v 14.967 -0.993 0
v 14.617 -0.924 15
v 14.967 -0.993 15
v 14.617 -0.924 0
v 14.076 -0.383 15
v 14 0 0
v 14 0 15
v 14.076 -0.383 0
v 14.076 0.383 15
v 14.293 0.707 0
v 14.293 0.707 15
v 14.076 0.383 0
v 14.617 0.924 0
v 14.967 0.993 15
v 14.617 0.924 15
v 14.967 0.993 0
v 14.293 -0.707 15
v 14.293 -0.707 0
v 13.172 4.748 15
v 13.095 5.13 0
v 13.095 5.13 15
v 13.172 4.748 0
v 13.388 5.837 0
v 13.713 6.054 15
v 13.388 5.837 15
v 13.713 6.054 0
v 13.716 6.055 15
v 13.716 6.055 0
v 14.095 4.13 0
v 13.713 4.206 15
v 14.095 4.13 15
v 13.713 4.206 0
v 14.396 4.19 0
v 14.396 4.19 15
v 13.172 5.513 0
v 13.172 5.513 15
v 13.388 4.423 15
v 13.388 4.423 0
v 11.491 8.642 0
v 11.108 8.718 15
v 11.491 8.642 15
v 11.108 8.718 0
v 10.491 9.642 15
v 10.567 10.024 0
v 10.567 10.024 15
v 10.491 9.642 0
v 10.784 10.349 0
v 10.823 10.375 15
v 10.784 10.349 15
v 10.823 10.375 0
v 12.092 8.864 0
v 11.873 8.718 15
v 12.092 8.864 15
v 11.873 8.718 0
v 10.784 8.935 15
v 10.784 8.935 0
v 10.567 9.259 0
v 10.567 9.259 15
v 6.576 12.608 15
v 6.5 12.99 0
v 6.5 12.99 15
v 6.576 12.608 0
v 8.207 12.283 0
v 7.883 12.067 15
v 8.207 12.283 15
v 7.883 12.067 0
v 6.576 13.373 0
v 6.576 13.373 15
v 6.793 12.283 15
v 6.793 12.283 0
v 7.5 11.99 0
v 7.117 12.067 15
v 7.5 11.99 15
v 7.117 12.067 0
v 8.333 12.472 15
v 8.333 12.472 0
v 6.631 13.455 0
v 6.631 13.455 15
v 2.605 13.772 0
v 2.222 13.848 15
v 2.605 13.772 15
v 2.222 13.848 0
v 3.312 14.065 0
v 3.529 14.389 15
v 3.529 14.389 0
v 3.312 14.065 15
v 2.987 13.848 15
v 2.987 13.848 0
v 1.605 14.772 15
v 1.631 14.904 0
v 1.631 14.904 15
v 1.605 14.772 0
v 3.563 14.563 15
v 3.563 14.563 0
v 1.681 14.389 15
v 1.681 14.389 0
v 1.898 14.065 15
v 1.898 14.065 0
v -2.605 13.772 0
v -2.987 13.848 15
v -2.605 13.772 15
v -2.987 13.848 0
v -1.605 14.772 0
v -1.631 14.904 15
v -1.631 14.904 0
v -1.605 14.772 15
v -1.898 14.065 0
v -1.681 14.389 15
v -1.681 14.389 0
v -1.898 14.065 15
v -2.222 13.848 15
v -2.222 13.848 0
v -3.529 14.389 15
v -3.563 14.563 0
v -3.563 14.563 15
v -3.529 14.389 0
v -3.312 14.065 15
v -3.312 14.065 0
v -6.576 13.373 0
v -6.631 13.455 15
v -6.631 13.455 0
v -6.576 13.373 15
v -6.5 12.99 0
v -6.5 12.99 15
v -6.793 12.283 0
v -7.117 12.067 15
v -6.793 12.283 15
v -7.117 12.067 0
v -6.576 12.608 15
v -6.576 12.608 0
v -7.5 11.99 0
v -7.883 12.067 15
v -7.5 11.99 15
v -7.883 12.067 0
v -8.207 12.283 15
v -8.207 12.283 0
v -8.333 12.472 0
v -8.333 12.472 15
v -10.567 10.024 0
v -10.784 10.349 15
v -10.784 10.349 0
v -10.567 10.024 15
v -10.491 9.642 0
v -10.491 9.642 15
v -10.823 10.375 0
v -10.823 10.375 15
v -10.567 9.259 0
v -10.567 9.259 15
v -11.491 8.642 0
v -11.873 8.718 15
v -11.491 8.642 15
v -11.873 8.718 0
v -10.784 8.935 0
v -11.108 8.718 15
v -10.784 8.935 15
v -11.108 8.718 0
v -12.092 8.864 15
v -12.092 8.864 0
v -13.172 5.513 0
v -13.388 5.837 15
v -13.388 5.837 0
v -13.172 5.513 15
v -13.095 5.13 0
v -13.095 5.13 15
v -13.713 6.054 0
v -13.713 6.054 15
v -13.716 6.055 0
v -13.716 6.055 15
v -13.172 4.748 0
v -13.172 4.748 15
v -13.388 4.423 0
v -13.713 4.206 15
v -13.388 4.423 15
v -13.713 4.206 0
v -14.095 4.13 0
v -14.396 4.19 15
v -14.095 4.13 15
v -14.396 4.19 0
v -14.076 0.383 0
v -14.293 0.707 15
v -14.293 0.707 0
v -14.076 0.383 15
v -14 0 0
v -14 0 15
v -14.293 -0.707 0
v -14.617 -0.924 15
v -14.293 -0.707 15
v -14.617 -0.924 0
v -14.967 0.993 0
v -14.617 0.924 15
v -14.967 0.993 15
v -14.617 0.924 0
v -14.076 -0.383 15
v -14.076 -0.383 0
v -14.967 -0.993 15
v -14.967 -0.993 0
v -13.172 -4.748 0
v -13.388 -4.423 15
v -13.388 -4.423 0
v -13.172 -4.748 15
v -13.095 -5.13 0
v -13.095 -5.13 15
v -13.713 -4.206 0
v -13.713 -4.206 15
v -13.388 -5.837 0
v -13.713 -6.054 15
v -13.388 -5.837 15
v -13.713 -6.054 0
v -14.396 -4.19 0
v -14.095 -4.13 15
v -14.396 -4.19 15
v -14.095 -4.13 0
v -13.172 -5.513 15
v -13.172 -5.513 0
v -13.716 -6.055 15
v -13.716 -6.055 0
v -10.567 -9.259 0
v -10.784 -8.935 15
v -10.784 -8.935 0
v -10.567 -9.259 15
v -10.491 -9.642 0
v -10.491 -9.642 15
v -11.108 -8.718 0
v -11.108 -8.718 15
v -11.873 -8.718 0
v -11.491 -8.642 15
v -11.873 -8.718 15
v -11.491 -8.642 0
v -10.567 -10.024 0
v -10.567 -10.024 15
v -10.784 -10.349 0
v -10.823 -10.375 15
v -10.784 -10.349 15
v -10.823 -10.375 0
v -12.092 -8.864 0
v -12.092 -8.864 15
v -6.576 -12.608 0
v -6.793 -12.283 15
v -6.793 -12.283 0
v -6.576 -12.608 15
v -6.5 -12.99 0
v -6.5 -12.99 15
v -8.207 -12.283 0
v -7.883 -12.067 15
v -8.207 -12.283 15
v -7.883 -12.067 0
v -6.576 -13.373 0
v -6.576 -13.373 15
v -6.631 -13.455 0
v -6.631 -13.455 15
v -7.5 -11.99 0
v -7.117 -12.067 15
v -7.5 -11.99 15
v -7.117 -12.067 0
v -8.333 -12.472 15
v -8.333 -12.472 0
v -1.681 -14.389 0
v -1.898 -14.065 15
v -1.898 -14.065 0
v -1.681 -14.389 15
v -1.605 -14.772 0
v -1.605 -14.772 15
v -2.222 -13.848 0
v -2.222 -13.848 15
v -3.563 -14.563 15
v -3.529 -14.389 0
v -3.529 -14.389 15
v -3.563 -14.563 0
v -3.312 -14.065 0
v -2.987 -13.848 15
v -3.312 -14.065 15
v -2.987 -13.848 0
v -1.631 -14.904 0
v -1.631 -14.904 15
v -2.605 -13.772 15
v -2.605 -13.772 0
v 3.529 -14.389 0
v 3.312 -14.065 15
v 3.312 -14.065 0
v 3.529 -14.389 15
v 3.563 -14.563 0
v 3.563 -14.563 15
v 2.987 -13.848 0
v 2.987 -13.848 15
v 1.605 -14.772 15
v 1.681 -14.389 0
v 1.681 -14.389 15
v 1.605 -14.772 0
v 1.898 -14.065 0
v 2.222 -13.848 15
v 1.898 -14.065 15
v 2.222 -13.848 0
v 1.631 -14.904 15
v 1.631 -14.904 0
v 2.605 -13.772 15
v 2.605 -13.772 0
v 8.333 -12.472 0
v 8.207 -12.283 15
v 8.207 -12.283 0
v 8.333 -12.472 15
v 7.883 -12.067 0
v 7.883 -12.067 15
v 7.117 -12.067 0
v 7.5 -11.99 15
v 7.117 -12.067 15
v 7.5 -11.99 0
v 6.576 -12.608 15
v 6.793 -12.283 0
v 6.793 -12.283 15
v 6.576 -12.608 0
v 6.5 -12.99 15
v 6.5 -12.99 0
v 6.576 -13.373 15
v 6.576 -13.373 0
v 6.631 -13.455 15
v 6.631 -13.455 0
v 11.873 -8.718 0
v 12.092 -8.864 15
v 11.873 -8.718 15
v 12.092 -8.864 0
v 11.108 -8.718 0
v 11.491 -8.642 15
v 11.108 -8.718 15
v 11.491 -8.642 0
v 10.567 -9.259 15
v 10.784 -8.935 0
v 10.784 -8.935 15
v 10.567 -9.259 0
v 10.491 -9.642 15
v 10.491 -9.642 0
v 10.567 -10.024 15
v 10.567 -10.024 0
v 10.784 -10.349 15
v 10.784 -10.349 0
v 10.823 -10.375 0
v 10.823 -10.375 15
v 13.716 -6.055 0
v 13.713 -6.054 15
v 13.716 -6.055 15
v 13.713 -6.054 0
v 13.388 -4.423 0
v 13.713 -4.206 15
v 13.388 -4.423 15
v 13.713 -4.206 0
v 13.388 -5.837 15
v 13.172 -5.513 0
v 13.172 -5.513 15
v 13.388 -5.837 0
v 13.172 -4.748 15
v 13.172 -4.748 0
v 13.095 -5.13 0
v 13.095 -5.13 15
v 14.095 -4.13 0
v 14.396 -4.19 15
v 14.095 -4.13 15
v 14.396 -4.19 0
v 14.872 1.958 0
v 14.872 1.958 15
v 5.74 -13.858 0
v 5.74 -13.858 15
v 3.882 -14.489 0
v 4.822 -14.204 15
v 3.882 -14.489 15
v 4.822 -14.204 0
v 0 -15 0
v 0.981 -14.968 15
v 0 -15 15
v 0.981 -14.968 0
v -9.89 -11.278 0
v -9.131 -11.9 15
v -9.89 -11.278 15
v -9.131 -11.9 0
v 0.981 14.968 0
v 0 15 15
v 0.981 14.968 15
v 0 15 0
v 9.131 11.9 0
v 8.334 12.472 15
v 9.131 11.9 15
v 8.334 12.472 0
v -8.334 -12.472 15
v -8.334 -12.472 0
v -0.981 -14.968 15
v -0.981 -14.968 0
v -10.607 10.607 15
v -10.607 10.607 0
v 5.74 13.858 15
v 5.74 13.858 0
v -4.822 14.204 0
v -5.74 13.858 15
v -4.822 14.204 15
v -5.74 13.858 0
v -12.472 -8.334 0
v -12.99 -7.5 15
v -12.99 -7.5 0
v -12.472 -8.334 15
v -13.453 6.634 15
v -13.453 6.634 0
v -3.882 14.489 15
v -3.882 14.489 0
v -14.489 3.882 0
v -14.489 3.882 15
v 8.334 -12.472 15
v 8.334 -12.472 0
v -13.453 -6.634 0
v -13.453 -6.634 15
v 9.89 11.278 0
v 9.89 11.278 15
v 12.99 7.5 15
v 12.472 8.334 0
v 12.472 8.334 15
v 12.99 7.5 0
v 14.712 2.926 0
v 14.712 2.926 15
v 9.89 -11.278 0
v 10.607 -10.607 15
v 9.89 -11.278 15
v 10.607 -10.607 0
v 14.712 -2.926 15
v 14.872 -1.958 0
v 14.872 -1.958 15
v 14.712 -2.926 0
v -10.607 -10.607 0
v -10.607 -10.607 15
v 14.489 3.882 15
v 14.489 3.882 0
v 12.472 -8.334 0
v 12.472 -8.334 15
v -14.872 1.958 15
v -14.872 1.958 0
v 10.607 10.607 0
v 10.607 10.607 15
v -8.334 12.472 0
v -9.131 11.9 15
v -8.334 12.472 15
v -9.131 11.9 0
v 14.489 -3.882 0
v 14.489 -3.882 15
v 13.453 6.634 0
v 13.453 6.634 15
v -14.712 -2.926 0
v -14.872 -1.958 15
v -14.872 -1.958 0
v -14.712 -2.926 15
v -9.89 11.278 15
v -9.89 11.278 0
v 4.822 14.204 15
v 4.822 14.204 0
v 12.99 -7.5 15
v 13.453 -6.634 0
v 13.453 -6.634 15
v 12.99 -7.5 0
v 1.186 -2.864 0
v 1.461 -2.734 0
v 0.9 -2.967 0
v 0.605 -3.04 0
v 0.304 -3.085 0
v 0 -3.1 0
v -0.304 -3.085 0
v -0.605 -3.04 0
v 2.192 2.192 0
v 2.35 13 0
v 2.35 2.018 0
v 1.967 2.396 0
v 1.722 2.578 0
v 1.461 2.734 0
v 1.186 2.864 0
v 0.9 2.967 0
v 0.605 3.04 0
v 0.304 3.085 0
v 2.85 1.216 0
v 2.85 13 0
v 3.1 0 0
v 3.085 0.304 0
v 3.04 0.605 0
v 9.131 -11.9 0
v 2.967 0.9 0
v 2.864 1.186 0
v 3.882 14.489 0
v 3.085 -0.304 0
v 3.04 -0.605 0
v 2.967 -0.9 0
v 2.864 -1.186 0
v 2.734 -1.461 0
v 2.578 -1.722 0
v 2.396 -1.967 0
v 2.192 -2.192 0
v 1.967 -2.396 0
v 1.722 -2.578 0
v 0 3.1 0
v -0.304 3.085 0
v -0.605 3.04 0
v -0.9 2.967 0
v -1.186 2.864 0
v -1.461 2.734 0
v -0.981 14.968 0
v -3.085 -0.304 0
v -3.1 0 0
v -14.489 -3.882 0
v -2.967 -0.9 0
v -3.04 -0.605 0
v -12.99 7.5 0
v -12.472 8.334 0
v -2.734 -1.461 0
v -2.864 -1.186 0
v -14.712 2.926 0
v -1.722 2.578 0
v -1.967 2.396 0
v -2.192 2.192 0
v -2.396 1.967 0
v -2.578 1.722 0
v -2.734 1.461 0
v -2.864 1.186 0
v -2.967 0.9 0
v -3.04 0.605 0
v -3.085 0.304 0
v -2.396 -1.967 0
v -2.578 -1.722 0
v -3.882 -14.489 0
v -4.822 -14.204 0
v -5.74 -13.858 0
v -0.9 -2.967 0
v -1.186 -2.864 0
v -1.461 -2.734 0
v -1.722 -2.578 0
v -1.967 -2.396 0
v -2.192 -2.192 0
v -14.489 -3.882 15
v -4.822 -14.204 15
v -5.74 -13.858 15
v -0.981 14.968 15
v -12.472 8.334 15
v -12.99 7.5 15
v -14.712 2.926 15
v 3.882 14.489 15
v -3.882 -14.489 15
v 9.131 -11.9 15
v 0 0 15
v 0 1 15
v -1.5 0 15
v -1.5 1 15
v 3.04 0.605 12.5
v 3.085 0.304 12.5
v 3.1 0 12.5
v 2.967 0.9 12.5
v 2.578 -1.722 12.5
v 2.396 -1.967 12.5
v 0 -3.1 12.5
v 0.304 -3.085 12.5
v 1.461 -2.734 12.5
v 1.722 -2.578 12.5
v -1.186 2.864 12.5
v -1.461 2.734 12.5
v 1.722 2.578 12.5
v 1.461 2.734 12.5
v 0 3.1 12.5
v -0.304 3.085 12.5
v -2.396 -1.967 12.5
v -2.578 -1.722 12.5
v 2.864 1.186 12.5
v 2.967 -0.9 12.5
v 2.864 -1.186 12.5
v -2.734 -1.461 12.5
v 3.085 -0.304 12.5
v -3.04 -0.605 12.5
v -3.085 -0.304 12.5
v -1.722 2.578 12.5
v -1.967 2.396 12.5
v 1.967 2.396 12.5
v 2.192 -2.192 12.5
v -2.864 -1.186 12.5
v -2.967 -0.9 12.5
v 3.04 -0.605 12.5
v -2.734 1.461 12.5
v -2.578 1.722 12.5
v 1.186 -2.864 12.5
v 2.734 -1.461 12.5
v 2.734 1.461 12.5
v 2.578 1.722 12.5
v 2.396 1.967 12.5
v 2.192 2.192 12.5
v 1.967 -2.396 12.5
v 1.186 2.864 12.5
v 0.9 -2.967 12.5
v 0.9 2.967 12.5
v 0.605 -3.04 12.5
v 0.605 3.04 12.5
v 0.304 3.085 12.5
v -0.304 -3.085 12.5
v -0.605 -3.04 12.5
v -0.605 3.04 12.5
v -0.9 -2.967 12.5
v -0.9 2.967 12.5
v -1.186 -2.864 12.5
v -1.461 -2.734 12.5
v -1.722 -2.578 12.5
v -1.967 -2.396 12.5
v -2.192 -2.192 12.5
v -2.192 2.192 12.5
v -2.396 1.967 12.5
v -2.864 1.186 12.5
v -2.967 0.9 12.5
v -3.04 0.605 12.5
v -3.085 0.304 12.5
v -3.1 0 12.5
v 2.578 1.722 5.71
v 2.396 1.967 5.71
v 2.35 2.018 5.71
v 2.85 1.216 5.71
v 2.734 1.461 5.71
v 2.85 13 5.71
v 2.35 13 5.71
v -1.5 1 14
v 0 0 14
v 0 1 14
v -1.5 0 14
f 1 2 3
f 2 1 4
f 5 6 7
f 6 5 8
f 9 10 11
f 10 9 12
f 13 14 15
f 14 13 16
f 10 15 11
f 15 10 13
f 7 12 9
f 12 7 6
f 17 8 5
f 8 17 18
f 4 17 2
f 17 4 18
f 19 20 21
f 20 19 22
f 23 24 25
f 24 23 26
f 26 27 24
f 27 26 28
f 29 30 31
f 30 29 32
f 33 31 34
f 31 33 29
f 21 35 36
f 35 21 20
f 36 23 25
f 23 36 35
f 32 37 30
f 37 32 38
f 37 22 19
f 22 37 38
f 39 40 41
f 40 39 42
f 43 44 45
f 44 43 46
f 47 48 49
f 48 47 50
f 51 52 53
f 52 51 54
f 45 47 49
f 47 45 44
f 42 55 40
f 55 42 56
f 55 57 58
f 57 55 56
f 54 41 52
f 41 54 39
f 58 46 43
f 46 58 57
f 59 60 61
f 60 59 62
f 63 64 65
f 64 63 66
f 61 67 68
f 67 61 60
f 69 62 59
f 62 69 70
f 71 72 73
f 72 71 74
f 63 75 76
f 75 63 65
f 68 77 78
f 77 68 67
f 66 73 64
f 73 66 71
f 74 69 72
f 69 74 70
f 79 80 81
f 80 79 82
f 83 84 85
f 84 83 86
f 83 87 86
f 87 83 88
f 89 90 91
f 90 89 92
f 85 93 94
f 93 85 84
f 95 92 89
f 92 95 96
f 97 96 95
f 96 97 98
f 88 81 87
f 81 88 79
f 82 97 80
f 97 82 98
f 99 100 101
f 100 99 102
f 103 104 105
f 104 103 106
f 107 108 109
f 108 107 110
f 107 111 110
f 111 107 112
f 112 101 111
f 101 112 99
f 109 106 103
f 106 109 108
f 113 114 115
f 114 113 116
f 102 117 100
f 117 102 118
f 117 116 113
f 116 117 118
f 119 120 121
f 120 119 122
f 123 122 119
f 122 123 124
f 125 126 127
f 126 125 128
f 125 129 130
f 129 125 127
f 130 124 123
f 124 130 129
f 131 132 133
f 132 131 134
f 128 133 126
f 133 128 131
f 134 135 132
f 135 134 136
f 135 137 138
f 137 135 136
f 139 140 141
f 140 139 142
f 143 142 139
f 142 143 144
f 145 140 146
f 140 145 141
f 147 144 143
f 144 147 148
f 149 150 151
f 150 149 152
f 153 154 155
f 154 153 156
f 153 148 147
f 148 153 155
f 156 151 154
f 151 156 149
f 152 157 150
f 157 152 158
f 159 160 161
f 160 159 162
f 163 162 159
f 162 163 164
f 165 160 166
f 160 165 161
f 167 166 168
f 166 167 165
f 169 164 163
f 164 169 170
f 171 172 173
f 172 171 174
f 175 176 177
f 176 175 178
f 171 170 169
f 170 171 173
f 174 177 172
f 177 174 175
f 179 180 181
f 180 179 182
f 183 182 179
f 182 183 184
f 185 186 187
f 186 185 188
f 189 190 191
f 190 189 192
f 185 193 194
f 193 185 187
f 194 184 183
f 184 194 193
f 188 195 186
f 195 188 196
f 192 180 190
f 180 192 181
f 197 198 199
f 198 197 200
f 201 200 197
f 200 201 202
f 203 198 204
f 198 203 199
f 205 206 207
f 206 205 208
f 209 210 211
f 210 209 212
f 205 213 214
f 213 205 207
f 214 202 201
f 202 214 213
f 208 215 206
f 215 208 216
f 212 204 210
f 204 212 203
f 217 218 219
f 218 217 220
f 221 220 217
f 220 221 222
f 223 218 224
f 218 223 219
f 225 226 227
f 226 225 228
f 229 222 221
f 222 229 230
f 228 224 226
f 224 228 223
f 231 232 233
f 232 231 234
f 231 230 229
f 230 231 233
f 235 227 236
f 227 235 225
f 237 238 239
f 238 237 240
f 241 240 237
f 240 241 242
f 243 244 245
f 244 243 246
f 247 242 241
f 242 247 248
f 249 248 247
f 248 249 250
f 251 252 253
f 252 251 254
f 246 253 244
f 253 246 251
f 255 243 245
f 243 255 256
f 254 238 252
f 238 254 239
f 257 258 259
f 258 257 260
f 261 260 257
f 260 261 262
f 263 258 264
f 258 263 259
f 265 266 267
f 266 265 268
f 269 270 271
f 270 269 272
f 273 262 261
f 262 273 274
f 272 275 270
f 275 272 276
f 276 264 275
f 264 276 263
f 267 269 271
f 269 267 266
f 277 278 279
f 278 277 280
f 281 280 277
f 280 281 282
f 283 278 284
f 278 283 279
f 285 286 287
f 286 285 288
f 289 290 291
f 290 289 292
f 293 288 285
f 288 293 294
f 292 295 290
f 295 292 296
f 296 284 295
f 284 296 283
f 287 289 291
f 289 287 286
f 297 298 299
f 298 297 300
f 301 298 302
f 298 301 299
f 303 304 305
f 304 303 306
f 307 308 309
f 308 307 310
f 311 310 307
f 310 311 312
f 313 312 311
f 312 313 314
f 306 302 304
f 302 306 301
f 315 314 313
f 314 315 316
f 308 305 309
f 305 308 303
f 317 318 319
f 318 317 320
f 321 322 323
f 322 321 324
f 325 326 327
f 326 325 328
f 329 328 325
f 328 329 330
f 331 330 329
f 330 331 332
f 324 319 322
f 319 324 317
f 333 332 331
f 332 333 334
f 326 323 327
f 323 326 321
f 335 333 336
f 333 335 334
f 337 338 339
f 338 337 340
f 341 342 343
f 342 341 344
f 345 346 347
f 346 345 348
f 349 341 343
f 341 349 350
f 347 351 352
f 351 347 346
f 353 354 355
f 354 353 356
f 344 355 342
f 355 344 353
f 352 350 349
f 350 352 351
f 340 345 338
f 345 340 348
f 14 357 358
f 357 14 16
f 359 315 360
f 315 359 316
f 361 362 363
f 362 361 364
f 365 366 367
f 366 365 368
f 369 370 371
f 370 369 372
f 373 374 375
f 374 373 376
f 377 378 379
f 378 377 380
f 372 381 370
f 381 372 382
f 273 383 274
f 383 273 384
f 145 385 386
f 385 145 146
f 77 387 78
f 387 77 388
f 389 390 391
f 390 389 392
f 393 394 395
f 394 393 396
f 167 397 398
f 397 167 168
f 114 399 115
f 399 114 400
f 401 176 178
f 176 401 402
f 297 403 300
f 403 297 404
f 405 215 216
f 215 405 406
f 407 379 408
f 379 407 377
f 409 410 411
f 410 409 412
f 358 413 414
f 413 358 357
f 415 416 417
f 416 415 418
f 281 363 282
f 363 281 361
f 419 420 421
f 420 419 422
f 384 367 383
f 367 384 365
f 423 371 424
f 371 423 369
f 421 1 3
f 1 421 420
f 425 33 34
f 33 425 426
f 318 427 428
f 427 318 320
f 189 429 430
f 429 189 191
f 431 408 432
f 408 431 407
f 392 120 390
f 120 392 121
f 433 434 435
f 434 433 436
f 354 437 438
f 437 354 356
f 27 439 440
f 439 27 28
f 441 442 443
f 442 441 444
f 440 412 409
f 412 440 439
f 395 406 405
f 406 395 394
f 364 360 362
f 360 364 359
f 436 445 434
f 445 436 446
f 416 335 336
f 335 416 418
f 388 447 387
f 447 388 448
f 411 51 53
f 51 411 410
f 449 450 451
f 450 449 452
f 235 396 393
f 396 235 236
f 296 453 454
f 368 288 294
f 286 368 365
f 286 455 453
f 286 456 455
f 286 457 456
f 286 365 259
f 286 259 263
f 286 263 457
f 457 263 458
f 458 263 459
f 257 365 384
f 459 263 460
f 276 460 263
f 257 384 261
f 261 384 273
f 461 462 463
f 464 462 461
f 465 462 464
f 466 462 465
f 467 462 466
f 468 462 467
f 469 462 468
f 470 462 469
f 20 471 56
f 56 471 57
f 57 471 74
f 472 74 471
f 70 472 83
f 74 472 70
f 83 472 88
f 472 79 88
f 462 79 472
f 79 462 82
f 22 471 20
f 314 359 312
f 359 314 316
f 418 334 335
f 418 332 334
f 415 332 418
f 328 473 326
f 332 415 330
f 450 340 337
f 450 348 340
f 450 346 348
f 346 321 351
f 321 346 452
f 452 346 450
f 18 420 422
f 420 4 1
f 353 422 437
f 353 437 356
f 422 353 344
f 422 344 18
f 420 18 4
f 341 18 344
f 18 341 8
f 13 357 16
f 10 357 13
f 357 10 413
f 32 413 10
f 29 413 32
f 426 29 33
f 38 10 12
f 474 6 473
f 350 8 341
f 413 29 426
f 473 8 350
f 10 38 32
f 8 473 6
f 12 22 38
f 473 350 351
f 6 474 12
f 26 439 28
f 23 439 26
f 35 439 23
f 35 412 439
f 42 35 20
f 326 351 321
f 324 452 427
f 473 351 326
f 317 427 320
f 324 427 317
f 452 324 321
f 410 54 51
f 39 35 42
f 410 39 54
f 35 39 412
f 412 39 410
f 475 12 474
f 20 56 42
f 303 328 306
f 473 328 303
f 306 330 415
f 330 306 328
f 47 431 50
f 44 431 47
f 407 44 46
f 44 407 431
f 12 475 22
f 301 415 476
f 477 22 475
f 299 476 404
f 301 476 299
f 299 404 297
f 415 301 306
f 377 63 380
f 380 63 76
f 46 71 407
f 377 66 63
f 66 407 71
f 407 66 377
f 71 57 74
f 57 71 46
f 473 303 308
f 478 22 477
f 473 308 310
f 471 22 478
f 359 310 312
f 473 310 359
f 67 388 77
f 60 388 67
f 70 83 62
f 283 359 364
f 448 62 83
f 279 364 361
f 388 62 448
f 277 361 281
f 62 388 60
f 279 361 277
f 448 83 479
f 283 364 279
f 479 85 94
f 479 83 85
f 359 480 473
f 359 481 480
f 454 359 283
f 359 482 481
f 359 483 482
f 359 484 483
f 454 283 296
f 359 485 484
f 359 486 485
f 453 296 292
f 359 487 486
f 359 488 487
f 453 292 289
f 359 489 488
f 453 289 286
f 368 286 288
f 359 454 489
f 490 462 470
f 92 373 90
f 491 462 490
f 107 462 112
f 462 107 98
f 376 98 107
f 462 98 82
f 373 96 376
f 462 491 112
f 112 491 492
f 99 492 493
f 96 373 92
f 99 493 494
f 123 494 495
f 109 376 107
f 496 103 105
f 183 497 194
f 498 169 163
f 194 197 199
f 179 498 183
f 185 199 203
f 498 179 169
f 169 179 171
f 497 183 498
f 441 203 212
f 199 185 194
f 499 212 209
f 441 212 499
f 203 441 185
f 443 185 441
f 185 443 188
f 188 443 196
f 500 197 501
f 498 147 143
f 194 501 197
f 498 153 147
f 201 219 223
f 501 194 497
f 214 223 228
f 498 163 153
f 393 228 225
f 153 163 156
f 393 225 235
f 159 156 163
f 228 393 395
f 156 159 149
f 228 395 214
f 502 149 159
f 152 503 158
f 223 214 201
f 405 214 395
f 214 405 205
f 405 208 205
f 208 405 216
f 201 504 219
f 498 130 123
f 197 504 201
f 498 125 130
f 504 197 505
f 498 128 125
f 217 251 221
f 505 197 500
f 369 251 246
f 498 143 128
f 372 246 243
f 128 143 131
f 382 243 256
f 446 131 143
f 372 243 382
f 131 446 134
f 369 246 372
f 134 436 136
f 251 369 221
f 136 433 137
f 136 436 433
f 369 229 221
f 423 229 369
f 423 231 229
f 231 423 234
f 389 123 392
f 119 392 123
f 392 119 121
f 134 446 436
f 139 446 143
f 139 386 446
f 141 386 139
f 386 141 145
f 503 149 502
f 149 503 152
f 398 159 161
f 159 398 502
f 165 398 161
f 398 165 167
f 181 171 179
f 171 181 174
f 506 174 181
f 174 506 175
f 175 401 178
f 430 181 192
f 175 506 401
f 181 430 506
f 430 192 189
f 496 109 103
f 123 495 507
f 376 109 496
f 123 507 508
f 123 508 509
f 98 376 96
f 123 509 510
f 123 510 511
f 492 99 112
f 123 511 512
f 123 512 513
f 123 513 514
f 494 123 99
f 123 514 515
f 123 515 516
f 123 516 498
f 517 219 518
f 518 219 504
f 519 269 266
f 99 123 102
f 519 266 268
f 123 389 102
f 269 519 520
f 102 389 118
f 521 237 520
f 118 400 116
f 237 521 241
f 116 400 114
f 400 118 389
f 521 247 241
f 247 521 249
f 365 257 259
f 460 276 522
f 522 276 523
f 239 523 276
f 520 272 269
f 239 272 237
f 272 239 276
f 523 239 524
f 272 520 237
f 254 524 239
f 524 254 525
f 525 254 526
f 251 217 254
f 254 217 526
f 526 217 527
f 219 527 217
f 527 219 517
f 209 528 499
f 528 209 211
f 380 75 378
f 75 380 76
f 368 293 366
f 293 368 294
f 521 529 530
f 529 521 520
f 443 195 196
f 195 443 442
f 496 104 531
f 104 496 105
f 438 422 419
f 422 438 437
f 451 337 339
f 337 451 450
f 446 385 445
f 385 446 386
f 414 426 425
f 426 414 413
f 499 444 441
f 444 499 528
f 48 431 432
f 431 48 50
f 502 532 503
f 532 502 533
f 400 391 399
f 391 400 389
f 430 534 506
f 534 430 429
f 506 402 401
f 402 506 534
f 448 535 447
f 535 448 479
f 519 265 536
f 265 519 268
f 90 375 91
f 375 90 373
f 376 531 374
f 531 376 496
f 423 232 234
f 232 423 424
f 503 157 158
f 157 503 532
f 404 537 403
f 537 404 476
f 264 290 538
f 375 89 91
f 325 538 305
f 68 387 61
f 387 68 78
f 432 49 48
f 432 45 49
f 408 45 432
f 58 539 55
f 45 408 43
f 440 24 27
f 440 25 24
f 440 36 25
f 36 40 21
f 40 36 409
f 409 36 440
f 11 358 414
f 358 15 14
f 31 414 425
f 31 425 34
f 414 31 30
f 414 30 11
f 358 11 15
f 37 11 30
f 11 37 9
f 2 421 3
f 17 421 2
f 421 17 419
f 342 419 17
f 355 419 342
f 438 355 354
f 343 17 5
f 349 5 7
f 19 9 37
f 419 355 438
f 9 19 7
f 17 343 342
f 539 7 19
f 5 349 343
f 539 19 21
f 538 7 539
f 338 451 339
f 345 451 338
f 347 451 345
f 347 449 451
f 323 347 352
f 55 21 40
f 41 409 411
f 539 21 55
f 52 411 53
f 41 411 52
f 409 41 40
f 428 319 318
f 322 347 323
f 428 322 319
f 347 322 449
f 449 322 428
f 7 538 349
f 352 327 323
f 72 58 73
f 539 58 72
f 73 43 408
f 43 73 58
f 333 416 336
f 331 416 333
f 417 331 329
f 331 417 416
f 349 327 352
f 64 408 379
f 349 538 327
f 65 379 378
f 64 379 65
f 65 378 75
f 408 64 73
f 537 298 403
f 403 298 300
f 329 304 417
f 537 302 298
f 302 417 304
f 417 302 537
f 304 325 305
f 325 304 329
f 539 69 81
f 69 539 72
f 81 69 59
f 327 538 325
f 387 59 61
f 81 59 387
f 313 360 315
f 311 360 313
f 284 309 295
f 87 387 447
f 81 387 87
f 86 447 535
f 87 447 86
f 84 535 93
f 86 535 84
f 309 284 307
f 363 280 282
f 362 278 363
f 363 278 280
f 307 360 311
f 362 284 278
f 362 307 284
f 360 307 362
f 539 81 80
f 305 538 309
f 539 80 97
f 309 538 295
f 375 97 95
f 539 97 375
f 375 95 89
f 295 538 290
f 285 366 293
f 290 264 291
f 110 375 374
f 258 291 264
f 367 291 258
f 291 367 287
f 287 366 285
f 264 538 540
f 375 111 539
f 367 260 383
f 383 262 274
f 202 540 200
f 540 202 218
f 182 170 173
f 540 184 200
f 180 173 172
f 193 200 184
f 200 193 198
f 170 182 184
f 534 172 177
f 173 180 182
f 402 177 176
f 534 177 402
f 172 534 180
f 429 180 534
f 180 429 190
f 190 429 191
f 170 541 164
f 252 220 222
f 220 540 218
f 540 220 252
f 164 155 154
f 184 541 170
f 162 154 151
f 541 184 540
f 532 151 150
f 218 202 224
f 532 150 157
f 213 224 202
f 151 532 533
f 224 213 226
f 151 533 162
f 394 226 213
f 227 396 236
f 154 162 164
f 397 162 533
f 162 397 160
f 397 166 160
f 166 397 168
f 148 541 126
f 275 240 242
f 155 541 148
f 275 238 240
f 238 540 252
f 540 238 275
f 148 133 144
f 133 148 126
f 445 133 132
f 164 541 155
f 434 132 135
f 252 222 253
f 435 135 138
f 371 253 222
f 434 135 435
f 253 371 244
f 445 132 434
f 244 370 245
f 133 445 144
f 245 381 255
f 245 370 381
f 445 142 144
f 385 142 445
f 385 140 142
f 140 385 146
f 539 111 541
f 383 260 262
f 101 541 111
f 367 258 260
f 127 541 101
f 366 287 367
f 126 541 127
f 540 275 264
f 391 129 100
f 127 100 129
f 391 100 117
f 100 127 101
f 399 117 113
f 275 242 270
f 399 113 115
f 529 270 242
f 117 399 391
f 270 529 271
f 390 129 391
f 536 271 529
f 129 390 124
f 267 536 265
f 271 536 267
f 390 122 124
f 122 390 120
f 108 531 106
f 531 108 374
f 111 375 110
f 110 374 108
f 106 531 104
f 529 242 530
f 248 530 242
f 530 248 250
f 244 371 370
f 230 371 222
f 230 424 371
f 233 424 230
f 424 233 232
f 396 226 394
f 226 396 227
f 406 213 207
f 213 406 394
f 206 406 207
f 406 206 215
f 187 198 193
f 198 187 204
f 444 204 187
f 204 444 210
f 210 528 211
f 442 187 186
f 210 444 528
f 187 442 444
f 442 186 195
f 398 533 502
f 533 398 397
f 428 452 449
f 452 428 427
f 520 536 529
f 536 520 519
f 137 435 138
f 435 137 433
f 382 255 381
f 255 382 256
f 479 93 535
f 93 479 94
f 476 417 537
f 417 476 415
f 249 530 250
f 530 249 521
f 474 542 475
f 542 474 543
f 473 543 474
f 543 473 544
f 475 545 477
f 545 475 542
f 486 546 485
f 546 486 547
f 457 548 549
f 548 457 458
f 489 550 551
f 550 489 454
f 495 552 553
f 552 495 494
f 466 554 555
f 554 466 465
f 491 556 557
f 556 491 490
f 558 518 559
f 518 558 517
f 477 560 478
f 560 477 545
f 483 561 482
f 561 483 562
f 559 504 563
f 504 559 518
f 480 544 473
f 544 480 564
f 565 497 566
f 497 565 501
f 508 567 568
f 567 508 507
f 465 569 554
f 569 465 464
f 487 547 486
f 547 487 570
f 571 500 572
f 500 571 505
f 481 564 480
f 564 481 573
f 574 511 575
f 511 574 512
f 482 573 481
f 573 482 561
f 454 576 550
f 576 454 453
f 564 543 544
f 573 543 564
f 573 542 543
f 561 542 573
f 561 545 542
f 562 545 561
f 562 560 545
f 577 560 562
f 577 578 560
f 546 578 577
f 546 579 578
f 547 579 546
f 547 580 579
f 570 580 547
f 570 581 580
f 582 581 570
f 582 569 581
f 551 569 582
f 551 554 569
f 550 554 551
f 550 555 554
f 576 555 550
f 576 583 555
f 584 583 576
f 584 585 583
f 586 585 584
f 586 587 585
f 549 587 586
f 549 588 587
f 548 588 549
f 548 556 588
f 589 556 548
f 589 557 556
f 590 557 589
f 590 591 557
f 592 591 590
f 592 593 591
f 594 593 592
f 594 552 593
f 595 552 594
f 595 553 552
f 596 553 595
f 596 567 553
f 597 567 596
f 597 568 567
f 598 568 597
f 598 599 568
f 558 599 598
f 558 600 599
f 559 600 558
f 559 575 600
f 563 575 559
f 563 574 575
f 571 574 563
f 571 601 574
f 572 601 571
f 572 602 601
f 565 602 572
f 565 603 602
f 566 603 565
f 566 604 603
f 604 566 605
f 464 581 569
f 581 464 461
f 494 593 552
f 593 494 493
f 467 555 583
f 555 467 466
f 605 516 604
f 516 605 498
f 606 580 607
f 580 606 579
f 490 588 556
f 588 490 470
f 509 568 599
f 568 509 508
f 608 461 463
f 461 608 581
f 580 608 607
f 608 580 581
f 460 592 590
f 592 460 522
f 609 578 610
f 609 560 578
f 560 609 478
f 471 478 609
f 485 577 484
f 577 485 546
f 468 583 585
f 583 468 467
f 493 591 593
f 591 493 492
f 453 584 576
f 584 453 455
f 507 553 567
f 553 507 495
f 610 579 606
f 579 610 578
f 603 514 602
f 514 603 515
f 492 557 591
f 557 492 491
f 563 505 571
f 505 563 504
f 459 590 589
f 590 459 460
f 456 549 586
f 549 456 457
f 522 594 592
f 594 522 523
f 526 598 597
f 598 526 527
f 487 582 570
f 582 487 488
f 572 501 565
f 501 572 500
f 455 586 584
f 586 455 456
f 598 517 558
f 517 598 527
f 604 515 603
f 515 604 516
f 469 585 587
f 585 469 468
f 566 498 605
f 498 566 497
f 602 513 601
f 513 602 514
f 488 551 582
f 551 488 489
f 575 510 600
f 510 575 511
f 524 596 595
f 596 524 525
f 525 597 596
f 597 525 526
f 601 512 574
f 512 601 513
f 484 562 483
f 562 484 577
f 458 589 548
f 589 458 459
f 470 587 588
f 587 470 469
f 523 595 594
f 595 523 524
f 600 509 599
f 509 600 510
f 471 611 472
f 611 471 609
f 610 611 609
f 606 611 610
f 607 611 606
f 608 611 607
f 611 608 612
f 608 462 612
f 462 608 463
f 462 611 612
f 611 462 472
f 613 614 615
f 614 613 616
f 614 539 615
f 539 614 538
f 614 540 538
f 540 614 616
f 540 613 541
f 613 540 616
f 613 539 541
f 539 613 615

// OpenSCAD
// Replacement knob for hotplate stirrer with D-shaft
// Print orientation: bottom face (with D-bore) on the bed (z = 0)

// ---------------- Parameters ----------------
knob_d          = 30;    // knob outer diameter
knob_h          = 15;    // knob height
shaft_d         = 6;     // D-shaft diameter
bore_depth      = 12;    // blind bore depth from bottom face
bore_d          = 6.2;   // bore circle diameter
bore_flat       = 4.7;   // distance from flat to opposite side of bore
groove_count    = 18;    // number of grip grooves
groove_d        = 2;     // groove diameter (half-cylinder)
pointer_w       = 1.5;   // pointer groove width
pointer_d       = 1;     // pointer groove depth
eps             = 0.5;   // overcut for clean differences
$fn             = 96;    // curve resolution

// Derived
bore_r          = bore_d / 2;
flat_x          = bore_flat / 2;   // flat centre offset (X+)
outer_r         = knob_d / 2;

// ---------------- Model ----------------
difference() {
    // Main knob body
    cylinder(d = knob_d, h = knob_h);

    // D-shaped blind bore from bottom face
    translate([0, 0, -eps])
        cylinder(r = bore_r, h = bore_depth + 2 * eps, $fn = 64);

    // Flat on one side of the bore
    translate([flat_x, 0, -eps])
        cube([eps, bore_depth + 2 * eps, 2 * bore_r + 0.01]);

    // Vertical grip grooves around the full height
    for (i = [0 : groove_count - 1]) {
        a = i * 360 / groove_count;
        translate([outer_r * cos(a), outer_r * sin(a), -eps])
            cylinder(d = groove_d, h = knob_h + 2 * eps, $fn = 16);
    }

    // Pointer groove on top face, same side as the bore flat
    translate([-pointer_w / 2, 0, knob_h - pointer_d])
        linear_extrude(height = pointer_d + eps)
            polygon([[-pointer_w / 2, 0], [pointer_w / 2, 0],
                     [pointer_w / 2, pointer_d], [-pointer_w / 2, pointer_d]]);
}
